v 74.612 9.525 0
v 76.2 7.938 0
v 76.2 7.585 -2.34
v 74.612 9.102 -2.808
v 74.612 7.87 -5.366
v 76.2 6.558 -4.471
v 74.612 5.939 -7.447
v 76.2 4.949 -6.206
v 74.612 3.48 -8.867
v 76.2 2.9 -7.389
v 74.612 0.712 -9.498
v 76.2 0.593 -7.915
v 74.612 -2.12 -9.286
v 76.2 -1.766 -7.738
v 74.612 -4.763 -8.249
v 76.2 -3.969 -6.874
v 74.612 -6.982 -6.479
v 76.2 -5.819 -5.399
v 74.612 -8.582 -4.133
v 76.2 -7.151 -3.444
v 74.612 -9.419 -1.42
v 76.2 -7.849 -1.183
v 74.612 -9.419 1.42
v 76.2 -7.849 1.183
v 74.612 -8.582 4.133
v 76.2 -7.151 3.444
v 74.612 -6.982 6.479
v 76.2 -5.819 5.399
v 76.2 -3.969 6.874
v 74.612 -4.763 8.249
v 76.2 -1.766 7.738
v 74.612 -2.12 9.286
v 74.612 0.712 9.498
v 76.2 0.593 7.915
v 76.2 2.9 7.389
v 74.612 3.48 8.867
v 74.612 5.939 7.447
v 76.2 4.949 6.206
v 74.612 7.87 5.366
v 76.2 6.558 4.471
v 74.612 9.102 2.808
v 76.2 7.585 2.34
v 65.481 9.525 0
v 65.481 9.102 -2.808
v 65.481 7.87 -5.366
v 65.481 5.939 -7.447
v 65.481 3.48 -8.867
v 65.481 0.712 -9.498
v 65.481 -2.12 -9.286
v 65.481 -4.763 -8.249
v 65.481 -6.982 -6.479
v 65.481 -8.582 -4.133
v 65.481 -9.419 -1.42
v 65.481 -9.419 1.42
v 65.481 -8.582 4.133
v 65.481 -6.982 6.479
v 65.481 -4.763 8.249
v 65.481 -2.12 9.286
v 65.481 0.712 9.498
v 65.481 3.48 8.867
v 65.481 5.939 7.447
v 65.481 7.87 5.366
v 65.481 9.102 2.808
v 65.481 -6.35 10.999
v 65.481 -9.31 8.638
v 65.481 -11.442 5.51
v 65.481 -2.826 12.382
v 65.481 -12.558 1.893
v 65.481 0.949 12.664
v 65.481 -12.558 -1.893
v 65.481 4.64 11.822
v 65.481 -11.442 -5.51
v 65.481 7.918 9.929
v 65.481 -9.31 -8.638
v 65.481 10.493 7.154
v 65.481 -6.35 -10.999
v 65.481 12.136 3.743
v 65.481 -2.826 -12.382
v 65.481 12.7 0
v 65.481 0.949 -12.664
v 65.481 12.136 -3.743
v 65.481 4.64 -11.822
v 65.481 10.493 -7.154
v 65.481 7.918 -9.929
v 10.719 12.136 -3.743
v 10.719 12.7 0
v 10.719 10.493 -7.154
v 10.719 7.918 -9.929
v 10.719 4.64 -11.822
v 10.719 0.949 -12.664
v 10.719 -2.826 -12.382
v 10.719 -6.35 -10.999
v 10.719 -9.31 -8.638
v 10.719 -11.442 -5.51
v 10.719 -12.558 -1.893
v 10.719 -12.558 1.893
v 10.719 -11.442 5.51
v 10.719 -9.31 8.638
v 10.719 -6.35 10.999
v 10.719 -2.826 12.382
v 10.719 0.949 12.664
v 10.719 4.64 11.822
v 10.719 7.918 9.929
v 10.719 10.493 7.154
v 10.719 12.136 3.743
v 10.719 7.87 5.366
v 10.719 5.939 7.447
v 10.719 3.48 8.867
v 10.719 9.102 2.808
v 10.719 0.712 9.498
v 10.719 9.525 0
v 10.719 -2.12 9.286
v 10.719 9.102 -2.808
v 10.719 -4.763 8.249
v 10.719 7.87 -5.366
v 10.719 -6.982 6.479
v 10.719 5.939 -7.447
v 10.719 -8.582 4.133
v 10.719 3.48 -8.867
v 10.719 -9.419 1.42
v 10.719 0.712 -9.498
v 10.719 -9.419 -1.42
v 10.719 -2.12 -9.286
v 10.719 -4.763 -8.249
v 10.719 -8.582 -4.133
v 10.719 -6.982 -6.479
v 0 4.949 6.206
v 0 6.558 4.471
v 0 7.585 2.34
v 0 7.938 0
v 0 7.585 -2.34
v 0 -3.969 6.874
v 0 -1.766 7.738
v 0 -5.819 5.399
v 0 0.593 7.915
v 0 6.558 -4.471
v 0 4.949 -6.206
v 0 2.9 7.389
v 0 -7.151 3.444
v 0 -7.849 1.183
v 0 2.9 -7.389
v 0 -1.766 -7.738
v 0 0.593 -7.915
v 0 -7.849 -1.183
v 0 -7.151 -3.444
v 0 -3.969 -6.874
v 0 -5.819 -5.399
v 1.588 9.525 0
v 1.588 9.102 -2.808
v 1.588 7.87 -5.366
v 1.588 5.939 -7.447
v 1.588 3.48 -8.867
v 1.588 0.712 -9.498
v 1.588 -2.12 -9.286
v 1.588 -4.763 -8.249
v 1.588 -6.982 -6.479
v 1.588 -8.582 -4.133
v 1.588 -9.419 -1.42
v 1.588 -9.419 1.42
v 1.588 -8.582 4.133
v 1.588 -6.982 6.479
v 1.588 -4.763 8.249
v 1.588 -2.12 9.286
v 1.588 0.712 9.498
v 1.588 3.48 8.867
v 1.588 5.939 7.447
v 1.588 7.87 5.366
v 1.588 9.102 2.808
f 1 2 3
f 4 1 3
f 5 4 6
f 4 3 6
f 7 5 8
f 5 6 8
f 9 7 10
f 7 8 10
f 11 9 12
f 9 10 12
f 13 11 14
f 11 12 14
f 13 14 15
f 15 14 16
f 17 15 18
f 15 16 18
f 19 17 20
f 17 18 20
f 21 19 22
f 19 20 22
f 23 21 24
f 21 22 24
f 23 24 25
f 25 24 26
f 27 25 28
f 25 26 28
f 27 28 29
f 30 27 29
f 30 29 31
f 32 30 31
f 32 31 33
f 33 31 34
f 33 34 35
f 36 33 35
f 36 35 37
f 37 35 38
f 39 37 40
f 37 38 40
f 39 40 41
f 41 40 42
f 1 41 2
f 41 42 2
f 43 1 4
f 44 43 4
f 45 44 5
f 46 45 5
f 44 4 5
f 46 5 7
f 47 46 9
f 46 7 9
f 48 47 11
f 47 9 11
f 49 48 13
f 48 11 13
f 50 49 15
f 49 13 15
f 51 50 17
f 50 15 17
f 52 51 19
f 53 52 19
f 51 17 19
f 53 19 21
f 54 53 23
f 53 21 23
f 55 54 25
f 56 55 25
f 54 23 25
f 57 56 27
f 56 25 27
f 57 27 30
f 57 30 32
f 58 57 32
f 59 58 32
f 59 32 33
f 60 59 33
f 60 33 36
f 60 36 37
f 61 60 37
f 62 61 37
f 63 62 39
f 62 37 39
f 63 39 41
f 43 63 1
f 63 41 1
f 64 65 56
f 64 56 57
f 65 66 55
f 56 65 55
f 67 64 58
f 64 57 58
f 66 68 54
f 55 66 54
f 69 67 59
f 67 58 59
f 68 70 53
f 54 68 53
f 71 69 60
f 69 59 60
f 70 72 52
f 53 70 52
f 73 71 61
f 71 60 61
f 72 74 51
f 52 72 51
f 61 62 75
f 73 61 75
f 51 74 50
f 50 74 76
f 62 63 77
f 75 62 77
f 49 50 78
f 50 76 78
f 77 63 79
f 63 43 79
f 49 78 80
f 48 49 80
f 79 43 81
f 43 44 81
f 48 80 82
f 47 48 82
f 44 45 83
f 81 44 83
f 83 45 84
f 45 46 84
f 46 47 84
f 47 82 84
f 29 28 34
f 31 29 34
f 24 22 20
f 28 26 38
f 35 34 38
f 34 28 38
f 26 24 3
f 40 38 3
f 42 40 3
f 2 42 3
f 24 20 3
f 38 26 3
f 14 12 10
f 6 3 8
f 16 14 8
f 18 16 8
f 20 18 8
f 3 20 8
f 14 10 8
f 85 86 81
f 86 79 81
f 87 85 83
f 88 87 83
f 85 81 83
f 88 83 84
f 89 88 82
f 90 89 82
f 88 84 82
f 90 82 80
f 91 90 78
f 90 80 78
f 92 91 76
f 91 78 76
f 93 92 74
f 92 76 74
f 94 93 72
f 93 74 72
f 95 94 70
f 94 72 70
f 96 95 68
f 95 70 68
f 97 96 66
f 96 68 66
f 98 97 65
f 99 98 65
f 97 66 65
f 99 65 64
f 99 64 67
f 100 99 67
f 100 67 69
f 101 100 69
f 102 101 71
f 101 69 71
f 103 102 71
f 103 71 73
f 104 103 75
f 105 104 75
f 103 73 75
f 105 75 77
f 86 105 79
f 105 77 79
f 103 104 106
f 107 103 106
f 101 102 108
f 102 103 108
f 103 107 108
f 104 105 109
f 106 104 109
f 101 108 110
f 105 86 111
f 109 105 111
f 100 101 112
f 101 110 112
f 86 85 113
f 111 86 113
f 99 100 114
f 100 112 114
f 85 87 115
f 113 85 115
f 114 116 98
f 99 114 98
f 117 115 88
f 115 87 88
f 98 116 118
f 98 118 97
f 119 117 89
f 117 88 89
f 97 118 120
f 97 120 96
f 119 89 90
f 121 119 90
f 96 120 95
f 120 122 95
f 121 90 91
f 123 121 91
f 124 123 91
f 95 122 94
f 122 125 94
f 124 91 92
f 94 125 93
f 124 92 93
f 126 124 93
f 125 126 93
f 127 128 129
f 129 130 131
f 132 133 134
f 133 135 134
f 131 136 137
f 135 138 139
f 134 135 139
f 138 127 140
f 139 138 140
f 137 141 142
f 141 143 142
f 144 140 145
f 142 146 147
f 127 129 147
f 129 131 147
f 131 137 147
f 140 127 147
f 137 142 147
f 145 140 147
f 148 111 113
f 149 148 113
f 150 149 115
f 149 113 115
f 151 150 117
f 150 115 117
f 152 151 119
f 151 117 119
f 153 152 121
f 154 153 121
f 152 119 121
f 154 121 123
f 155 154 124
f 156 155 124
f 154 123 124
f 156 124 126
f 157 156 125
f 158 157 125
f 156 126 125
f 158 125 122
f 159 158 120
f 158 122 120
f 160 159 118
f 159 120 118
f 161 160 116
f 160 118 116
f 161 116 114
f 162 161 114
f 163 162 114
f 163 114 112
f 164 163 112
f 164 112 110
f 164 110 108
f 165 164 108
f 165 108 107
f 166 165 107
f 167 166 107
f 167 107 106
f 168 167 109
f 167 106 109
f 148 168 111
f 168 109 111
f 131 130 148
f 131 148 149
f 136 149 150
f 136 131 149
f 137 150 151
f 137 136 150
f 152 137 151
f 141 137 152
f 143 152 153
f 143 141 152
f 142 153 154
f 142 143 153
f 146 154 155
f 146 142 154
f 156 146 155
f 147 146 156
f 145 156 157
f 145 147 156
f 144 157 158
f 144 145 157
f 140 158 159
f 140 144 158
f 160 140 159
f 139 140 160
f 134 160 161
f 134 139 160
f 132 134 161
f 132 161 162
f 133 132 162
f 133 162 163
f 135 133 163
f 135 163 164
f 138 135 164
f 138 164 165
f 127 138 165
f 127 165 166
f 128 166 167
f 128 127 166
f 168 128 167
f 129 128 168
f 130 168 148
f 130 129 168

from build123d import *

# Parameters (mm, degrees)
CHAMFER1_SIZE = 1.5875
CHAMFER2_SIZE = 1.5875


with BuildPart() as part:
    # Sketch1 → Revolve1 (revolve)
    with BuildSketch(Plane.XY):
        Polygon((0, 0), (0, 9.525), (10.7188, 9.525), (10.7188, 12.7), (65.4812, 12.7), (65.4812, 9.525), (76.2, 9.525), (76.2, 0), align=None)
    revolve(axis=Axis((76.2, 0, 0), (-1, 0, 0)))

    # Chamfer1
    chamfer1_edges = [part.edges().sort_by_distance(p)[0] for p in [
        (76.2, -9.525, 0),
    ]]
    chamfer(chamfer1_edges, length=CHAMFER1_SIZE)

    # Chamfer2
    chamfer2_edges = [part.edges().sort_by_distance(p)[0] for p in [
        (0, -9.525, 0),
    ]]
    chamfer(chamfer2_edges, length=CHAMFER2_SIZE)


solid = part.part
